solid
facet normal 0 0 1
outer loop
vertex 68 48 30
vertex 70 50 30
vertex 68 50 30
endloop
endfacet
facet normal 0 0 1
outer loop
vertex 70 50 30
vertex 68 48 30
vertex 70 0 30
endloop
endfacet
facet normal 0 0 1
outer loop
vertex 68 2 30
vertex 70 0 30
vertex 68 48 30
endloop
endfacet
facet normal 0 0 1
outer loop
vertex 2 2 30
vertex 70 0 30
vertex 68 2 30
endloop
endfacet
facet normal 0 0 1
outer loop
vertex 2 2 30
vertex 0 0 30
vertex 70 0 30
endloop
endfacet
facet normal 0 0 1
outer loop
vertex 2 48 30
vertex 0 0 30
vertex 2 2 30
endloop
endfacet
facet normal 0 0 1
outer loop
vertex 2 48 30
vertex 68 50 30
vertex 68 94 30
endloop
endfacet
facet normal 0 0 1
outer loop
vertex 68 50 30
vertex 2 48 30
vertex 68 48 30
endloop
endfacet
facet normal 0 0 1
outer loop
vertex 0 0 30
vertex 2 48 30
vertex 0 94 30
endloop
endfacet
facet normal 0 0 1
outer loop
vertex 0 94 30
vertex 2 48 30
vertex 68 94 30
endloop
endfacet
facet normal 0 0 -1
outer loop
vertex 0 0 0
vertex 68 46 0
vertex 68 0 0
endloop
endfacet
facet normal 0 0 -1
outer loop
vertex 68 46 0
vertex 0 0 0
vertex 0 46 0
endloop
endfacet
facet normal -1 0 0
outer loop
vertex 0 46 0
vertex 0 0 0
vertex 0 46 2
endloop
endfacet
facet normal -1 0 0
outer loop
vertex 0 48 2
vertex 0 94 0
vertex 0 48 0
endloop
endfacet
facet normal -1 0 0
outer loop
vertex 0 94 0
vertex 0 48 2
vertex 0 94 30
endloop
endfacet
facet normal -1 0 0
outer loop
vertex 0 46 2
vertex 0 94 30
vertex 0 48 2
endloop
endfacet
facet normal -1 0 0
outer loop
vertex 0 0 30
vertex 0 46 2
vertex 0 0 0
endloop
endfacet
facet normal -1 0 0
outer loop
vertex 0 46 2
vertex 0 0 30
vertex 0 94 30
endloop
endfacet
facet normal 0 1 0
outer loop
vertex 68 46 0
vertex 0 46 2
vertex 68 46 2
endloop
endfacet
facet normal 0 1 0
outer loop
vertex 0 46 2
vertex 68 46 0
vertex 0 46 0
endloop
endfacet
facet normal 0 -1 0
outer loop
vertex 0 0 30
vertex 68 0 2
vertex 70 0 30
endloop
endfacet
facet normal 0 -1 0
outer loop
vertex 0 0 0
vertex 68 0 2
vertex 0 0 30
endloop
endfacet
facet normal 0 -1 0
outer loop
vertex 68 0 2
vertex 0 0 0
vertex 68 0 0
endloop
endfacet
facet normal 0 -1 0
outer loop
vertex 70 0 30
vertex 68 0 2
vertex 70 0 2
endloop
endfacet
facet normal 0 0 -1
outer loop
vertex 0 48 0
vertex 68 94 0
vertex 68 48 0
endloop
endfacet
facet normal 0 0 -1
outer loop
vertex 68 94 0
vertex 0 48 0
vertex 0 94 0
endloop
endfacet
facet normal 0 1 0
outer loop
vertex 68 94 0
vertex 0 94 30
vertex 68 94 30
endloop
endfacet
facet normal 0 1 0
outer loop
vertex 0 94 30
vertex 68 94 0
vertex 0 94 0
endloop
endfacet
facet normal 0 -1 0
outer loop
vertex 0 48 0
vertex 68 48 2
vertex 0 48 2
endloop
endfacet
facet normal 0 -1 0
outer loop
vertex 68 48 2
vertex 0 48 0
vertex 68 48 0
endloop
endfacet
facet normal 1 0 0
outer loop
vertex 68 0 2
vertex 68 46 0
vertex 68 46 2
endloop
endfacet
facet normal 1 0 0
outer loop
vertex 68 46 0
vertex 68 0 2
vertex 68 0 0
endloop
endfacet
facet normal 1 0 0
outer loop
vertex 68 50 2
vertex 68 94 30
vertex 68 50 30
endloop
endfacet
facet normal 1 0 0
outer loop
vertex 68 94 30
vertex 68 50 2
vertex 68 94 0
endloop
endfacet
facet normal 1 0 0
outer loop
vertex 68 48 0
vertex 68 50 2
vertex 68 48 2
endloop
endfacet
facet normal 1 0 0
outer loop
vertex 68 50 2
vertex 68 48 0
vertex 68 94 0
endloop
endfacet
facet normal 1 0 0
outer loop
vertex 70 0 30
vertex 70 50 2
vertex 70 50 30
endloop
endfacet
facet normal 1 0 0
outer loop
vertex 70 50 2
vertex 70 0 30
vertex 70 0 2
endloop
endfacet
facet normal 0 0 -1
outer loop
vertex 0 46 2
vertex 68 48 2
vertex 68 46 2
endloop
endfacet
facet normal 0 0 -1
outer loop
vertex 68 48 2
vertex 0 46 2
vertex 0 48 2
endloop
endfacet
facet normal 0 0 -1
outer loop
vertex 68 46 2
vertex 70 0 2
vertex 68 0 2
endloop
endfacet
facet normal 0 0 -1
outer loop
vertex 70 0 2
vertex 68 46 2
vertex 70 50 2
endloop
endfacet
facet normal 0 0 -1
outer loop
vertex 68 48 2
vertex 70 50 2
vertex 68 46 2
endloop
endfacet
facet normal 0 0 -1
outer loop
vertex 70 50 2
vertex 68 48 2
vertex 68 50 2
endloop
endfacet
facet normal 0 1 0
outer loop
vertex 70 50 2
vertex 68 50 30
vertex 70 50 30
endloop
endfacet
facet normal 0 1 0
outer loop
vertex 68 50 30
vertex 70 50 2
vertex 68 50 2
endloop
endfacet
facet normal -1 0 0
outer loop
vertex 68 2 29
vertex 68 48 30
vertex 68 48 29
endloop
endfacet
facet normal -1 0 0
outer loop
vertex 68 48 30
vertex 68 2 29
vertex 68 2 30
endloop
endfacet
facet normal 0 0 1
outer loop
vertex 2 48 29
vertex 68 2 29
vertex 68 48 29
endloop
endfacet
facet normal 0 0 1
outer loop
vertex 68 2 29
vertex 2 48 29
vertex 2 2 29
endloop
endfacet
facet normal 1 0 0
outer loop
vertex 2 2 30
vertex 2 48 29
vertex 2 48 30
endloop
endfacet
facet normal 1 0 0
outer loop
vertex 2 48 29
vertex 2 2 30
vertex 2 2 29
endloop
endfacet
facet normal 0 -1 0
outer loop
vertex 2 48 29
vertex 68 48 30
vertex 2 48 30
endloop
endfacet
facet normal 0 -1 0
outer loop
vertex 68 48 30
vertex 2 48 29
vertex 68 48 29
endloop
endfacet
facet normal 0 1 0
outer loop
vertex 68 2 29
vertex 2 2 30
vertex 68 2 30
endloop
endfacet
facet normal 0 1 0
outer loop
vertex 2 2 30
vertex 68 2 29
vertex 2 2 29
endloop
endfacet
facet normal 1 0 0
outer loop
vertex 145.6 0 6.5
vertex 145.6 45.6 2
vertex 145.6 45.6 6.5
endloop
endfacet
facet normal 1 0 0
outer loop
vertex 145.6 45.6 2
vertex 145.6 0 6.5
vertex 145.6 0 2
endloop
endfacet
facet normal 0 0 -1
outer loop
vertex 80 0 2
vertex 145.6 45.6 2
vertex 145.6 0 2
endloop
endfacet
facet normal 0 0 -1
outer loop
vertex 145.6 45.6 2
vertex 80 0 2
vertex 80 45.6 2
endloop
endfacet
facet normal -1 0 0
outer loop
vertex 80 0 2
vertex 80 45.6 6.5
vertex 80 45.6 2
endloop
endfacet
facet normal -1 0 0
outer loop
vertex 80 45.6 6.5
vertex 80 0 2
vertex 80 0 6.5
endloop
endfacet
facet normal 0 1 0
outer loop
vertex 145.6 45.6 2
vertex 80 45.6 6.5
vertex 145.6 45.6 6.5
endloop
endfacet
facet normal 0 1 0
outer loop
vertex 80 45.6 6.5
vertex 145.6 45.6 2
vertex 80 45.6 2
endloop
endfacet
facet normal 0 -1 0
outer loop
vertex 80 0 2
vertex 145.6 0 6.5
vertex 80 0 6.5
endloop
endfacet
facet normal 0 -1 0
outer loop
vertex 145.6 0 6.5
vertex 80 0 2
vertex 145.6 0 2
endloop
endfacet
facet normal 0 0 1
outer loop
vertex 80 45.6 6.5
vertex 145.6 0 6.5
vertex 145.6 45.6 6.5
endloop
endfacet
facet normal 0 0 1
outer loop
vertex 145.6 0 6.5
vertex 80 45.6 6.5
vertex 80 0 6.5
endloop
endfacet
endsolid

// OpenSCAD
// Two-part enclosure for small electronics board
// Print orientation: box standing on the bed, lid on top (overlapping slightly)

$fn = 64;

// ---- Box ----
box_x = 70;    // outer length (X)
box_y = 50;    // outer width (Y)
box_z = 30;    // outer height (Z)
wall  = 2;     // wall thickness
floor = 2;     // floor thickness (separate from wall)

// ---- Lid ----
lip_x   = 65.6;      // outer length of lip (X)
lip_y   = 45.6;      // outer width of lip (Y)
lip_w   = 1.5;       // lip thickness (Z)
lip_h   = 4;         // lip height above plate (Z)
plate_t = 2;         // plate thickness (Z)
eps     = 0.5;       // overlap/overhang allowance

// ---- Layout ----
gap = 10;       // gap between box and lid (X direction)

module box() {
    difference() {
        union() {
            // Walls
            for (sx = [-1, 1], sy = [-1, 1])
                translate([sx > 0 ? wall : 0, sy > 0 ? box_y - wall : 0, 0])
                    cube([box_x - 2 * wall, box_y - 2 * wall, box_z]);
            // Floor
            translate([0, 0, floor])
                cube([box_x, box_y, box_z - floor]);
        }
        // Open top cut (extends above top face)
        translate([wall, wall, box_z - 1])
            cube([box_x - 2 * wall, box_y - 2 * wall, box_z + 1]);
    }
}

module lid() {
    union() {
        // Base plate
        translate([0, 0, plate_t])
            cube([lip_x, lip_y, plate_t]);
        // Lip on top of plate
        translate([0, 0, plate_t])
            cube([lip_x, lip_y, lip_h + eps]);
    }
}

difference() {
    union() {
        box();
        translate([box_x + gap, 0, 0])
            lid();
    }
    // Keep the lid's open-top cut clear of any lid material
    translate([box_x + gap - 1, -1, box_z - 1])
        cube([lip_x + 2, lip_y + 2, box_z + 1]);
}
